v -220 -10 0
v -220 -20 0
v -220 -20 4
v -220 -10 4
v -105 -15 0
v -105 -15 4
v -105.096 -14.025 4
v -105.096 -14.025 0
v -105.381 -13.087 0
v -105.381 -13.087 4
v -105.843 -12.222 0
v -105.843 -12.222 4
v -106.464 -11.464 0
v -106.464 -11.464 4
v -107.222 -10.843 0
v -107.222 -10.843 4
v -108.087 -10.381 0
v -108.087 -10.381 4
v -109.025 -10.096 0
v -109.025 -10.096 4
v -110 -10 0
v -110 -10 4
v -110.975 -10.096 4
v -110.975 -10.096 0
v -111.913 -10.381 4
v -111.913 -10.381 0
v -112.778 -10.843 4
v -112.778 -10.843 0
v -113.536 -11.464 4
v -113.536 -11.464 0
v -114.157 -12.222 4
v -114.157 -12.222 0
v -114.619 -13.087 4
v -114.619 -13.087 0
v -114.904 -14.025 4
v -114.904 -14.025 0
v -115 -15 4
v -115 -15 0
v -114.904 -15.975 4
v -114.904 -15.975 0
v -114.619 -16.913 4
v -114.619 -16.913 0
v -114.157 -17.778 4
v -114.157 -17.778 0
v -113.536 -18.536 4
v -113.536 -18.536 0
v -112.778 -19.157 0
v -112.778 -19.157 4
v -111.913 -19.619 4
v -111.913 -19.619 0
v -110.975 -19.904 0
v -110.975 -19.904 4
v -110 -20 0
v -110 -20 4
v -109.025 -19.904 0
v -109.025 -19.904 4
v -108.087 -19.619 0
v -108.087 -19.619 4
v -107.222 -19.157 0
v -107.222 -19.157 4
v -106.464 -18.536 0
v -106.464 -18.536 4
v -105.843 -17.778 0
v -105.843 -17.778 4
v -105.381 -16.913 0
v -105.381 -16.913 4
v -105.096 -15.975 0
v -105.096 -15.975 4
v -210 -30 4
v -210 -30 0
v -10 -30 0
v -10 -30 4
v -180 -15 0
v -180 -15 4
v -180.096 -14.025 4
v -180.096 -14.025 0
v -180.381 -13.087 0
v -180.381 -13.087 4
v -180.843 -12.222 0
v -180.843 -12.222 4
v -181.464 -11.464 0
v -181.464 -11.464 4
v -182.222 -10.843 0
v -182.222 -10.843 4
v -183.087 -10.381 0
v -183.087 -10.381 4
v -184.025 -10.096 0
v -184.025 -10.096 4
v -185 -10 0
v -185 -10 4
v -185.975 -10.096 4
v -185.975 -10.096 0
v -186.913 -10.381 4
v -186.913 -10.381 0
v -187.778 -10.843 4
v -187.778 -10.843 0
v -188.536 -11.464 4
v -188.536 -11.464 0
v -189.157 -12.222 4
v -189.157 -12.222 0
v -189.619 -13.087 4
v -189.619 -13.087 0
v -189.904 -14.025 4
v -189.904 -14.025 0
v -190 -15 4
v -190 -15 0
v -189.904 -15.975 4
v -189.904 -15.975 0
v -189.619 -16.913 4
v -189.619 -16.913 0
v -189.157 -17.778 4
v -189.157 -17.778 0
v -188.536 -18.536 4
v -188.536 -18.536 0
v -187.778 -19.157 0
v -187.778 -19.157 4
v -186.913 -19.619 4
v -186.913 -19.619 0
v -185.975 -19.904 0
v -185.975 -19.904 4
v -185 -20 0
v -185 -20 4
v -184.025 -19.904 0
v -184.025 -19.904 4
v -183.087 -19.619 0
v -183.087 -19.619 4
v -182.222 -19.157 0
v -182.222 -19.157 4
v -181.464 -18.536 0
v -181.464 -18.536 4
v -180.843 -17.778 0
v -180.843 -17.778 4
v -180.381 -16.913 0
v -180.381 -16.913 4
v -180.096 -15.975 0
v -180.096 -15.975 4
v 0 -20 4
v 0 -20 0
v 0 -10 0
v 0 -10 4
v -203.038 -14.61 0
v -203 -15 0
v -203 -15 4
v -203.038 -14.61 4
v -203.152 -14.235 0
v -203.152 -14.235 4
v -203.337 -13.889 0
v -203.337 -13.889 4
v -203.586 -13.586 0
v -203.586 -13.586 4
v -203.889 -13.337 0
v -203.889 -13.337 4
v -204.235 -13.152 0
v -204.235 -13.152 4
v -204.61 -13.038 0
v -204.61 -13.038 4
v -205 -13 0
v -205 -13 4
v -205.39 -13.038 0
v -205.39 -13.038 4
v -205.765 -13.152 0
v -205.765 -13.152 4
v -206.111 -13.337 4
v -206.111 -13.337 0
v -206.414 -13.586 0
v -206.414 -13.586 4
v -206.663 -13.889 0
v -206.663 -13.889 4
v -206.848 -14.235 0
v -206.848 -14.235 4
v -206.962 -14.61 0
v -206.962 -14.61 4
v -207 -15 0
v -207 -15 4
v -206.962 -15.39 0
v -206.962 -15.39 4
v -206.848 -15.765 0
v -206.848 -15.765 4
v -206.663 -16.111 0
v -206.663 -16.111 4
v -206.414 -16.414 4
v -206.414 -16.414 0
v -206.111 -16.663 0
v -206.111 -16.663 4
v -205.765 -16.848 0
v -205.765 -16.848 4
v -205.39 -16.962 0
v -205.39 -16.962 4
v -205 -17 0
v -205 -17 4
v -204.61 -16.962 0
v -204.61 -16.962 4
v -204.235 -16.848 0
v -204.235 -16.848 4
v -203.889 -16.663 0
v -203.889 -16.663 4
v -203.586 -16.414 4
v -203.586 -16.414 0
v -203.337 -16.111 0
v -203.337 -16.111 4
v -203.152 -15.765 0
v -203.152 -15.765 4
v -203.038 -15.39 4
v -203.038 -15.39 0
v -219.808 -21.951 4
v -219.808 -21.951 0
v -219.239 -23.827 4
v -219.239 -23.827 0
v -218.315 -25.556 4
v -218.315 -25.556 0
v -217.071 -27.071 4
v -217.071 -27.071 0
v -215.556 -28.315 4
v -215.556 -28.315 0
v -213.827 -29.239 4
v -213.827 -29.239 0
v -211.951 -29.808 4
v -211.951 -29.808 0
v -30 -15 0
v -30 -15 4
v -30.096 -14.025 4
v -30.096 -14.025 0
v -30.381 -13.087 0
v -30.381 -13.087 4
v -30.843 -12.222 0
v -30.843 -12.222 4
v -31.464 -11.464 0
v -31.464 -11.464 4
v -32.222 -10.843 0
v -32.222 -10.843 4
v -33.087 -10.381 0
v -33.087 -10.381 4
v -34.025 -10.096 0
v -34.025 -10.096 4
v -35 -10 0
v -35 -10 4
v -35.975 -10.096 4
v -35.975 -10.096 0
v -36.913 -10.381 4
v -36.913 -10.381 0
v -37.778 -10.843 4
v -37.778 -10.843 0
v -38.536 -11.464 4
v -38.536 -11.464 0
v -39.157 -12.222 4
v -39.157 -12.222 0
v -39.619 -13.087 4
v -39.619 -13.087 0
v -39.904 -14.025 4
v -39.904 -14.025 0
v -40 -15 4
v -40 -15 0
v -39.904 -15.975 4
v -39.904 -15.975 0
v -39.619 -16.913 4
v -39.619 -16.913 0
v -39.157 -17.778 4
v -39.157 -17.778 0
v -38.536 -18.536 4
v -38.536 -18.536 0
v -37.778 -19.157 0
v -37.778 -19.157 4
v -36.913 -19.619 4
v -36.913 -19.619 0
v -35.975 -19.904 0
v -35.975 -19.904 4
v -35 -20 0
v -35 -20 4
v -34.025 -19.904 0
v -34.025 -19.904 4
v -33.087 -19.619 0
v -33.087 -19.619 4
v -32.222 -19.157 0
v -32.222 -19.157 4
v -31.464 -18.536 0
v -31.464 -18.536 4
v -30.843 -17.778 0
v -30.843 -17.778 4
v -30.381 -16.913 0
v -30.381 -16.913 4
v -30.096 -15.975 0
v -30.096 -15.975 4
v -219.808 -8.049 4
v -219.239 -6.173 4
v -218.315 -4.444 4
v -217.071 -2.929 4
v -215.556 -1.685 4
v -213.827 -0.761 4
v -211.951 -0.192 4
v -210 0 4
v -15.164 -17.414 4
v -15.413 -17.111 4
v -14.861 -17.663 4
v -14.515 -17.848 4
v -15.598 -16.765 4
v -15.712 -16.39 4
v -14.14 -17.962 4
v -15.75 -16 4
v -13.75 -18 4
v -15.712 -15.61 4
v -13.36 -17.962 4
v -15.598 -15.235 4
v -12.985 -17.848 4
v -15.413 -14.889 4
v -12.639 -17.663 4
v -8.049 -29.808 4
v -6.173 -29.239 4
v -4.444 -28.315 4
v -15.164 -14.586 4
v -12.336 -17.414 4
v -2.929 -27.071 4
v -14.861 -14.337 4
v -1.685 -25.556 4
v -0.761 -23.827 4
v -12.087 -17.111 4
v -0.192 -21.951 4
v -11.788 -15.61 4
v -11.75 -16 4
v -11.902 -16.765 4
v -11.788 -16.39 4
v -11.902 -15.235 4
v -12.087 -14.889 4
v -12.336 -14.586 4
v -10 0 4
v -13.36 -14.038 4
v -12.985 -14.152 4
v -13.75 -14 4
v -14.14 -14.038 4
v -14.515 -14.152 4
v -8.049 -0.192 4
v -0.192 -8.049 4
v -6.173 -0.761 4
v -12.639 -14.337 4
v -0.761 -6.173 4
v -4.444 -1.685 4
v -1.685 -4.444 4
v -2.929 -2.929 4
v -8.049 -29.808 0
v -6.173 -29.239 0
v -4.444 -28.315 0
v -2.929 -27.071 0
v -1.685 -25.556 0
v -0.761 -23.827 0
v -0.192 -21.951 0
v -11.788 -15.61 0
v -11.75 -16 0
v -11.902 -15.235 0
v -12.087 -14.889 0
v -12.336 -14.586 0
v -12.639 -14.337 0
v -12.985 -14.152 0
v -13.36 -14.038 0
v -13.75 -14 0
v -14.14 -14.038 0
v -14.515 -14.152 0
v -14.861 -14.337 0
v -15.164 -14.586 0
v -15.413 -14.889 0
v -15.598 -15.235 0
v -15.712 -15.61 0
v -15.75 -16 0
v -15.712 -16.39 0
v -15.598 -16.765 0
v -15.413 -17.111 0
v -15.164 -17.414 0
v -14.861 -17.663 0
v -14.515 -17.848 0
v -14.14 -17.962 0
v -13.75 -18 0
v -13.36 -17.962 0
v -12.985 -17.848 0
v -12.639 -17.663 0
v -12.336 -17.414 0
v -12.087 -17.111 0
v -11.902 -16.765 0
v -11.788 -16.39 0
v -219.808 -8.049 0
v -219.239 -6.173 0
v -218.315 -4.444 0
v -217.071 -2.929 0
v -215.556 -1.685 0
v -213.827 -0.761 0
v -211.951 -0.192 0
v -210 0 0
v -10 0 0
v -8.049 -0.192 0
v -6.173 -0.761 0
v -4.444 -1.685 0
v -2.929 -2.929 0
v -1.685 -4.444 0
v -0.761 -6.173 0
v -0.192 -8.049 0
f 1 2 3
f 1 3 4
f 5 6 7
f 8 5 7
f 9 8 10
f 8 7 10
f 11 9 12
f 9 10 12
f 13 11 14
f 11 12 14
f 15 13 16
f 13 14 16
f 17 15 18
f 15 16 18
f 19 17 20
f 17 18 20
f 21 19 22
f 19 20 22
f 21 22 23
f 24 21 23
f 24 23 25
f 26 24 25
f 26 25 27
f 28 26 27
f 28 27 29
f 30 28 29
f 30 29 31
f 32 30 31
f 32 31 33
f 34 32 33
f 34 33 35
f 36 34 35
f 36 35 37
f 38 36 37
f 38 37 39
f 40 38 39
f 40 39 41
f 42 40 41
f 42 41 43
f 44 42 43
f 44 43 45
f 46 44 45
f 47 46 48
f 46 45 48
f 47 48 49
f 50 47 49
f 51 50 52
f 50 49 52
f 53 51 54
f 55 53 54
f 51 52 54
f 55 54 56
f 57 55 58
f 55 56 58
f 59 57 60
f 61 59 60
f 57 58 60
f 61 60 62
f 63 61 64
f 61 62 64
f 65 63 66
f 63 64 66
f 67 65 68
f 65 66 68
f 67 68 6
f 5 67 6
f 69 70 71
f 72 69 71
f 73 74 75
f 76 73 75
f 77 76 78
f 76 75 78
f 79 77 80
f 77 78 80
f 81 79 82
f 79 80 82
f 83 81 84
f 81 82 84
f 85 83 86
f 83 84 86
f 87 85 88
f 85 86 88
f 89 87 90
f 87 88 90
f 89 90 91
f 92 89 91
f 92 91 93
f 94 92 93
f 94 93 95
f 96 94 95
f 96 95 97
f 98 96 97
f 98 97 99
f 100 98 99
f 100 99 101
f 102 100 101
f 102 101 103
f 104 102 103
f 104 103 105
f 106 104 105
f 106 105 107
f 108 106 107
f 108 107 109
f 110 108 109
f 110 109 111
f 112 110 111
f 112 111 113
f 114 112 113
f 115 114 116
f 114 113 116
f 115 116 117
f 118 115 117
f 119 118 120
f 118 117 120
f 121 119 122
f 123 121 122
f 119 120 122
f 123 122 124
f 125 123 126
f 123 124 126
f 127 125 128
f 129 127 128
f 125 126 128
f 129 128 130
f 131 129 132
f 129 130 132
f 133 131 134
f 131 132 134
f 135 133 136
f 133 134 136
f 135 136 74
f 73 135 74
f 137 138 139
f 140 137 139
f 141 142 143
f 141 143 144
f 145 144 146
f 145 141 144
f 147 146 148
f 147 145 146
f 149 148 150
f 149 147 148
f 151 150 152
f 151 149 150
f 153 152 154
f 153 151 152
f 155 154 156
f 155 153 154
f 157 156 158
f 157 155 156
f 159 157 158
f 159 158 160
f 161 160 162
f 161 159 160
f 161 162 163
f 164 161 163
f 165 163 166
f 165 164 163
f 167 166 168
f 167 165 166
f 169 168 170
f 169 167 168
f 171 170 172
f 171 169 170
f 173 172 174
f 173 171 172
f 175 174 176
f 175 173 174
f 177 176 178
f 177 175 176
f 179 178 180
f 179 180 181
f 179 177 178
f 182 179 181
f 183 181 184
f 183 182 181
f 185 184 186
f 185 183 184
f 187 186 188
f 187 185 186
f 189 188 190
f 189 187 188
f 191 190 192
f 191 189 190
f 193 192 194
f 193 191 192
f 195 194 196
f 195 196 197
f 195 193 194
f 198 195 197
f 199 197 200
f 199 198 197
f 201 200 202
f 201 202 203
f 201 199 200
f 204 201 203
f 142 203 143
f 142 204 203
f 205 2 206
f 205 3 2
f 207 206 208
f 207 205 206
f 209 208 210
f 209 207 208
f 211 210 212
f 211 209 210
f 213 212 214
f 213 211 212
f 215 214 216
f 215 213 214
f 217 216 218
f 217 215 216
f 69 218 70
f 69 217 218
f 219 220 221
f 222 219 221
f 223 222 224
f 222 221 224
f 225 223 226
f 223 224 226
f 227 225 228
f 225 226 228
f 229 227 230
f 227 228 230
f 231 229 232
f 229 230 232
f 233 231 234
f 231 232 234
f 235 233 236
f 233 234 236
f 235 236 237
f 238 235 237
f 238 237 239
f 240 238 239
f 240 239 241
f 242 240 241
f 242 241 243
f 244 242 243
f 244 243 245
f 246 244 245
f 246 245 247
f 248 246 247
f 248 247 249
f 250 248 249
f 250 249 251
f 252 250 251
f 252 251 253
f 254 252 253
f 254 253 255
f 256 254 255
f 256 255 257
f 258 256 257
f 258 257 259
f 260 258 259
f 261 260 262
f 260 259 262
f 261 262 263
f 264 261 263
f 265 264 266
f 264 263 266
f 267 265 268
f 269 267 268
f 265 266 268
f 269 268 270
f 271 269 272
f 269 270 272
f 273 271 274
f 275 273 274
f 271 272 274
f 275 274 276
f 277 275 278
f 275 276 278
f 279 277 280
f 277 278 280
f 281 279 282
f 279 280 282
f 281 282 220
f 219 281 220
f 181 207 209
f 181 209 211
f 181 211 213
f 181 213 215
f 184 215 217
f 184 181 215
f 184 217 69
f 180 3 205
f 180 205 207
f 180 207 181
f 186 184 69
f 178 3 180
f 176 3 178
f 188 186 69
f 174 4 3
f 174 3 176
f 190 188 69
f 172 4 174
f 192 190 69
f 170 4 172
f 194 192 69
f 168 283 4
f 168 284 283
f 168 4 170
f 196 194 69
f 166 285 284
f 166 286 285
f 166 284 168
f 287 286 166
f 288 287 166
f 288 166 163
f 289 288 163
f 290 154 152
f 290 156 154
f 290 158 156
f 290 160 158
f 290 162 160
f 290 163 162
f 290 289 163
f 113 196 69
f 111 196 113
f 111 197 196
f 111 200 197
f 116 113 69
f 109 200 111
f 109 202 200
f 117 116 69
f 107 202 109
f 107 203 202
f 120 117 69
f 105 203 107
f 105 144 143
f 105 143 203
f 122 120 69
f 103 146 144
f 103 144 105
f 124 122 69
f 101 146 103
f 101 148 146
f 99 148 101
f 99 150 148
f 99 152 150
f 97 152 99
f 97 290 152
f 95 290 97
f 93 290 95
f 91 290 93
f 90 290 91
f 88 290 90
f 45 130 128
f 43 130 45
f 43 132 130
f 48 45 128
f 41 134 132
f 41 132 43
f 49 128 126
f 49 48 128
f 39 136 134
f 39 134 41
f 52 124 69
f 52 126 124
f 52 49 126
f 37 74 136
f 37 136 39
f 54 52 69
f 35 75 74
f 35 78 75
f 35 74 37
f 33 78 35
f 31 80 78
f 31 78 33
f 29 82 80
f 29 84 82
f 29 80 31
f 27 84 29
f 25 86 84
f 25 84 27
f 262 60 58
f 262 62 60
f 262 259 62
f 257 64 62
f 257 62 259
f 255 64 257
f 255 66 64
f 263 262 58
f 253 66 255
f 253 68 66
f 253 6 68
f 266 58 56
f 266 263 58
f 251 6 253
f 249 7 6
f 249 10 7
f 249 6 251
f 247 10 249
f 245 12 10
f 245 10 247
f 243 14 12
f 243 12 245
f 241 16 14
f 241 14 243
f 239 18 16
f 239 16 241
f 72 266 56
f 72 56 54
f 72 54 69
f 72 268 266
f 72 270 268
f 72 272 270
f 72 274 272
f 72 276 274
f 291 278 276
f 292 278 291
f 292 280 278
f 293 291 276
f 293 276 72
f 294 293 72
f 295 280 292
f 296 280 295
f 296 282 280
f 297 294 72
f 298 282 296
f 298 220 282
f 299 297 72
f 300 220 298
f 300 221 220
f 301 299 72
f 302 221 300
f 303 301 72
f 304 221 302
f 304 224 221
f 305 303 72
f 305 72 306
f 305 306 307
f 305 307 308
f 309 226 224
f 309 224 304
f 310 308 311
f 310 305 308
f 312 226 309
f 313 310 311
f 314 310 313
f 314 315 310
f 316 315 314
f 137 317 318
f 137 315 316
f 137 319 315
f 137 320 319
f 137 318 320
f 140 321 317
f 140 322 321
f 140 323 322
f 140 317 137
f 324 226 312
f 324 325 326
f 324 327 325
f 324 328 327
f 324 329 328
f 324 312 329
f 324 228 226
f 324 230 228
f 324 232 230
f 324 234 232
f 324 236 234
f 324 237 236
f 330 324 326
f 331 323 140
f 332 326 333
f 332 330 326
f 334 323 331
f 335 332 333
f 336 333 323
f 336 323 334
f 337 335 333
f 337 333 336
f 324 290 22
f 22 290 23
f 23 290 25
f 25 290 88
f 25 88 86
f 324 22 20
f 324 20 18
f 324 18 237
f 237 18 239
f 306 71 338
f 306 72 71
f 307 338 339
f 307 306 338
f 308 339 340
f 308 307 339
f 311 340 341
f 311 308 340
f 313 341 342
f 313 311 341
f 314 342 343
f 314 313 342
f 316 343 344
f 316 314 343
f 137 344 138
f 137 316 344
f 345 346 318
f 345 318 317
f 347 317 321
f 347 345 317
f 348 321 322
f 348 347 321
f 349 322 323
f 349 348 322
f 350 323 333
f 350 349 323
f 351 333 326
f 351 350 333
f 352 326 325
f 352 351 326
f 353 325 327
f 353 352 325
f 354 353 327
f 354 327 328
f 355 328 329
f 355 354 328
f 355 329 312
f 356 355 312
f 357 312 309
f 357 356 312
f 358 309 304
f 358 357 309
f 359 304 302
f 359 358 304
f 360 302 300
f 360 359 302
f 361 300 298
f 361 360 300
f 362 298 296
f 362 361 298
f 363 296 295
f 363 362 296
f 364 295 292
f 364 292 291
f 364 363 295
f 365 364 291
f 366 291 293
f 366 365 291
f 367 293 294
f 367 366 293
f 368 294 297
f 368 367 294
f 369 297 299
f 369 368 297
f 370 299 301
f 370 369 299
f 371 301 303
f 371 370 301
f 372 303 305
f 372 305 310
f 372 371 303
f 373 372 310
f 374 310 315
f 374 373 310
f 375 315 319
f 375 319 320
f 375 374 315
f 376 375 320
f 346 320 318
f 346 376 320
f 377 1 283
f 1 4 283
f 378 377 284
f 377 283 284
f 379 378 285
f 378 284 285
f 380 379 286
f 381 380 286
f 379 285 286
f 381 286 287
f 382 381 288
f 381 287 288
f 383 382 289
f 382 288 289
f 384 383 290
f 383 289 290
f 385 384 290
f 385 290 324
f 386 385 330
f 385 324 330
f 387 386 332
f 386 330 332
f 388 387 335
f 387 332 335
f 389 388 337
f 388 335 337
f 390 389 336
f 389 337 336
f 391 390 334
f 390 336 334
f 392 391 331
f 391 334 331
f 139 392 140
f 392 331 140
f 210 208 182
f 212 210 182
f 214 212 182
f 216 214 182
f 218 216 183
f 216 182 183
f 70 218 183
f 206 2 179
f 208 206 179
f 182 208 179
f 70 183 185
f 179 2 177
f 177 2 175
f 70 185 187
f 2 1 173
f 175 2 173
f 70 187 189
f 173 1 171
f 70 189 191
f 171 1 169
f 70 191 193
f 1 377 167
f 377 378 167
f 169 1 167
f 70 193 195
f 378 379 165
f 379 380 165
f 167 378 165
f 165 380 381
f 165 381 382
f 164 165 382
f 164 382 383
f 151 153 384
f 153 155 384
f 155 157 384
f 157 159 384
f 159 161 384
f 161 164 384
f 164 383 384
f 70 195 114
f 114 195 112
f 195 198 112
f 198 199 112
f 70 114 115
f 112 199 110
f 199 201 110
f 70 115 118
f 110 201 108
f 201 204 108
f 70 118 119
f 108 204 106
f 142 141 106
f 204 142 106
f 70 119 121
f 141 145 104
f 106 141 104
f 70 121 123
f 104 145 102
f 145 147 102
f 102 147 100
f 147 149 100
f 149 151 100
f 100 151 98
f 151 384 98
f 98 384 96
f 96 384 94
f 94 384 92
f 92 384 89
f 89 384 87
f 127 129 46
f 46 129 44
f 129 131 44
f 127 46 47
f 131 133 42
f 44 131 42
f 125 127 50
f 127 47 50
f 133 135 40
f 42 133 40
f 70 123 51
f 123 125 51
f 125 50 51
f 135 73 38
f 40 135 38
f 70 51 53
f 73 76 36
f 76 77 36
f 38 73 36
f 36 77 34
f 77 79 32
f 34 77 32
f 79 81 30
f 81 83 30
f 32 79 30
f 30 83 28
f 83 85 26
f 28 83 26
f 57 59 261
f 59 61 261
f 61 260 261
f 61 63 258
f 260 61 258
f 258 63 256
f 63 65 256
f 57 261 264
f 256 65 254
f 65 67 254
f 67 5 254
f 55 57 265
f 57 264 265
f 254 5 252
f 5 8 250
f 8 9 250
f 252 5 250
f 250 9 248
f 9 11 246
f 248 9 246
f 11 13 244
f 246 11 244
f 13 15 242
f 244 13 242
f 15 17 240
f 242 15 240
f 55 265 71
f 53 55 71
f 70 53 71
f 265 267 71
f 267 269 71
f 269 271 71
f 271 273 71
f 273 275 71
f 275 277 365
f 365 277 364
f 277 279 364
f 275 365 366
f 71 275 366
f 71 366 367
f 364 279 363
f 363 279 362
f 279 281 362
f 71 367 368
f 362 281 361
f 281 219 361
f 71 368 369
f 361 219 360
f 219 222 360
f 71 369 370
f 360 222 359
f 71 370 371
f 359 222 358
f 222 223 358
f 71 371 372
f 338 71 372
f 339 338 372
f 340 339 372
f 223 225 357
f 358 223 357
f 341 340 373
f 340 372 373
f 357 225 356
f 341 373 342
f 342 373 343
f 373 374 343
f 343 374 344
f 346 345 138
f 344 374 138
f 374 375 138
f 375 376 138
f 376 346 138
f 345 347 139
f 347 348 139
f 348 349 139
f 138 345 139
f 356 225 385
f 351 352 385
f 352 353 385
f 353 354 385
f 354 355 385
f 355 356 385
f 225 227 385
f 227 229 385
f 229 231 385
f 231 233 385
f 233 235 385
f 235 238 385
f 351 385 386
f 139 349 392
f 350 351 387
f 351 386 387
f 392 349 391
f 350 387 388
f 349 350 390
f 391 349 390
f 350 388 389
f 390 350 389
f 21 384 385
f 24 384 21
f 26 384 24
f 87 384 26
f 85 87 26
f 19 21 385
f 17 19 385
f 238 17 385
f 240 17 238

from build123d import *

# Parameters (mm, degrees)
SKETCH1_W           = 220
SKETCH1_H           = 30
SKETCH1_R           = 2
BOSS_EXTRUDE1_DEPTH = 4
FILLET1_R           = 10
SKETCH2_R           = 5
CUT_EXTRUDE1_DEPTH  = 10


with BuildPart() as part:
    # Sketch1 → Boss-Extrude1 (new body)
    with BuildSketch(Plane.XY):
        with Locations((-110, -15)):
            Rectangle(SKETCH1_W, SKETCH1_H)
        with Locations((-205, -15)):
            Circle(SKETCH1_R, mode=Mode.SUBTRACT)
        with Locations((-13.75, -16)):
            Circle(SKETCH1_R, mode=Mode.SUBTRACT)
    extrude(amount=BOSS_EXTRUDE1_DEPTH)

    # Fillet1
    fillet1_edges = [part.edges().sort_by_distance(p)[0] for p in [
        (0, -30, 2),
        (-220, -30, 2),
        (-220, 0, 2),
        (0, 0, 2),
    ]]
    fillet(fillet1_edges, radius=FILLET1_R)

    # Sketch2 → Cut-Extrude1 (cut)
    with BuildSketch(Plane.XY.offset(4)):
        with Locations((-185, -15)):
            Circle(SKETCH2_R)
        with Locations((-110, -15)):
            Circle(SKETCH2_R)
        with Locations((-35, -15)):
            Circle(SKETCH2_R)
    extrude(amount=-CUT_EXTRUDE1_DEPTH, mode=Mode.SUBTRACT)


solid = part.part
